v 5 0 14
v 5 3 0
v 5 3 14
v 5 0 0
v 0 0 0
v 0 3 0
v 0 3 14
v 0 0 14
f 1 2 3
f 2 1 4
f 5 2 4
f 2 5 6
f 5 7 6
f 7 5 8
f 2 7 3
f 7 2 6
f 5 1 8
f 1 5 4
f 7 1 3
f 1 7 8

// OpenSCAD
translate([2.5, 1.5, 1.0]) color([0.23049353673314077, 0.3658024748453319, 0.5965890354919068]) cube([5, 3, 2], center=true);
translate([2.5, 1.5, 3.0]) color([0.14329113966210216, 0.003232100641658797, 0.6590184917581017]) cube([5, 3, 2], center=true);
translate([2.5, 1.5, 5.0]) color([0.7321014772226084, 0.9009039411186286, 0.7479768172441763]) cube([5, 3, 2], center=true);
translate([2.5, 1.5, 7.0]) color([0.29326295382626455, 0.6894664766240866, 0.932788033819558]) cube([5, 3, 2], center=true);
translate([2.5, 1.5, 9.0]) color([0.23286310478430694, 0.14188743522012004, 0.4540480681686925]) cube([5, 3, 2], center=true);
translate([2.5, 1.5, 11.0]) color([0.4766939084563374, 0.7074804824528956, 0.2582188407343454]) cube([5, 3, 2], center=true);
translate([2.5, 1.5, 13.0]) color([0.027936242271358158, 0.20812012525081536, 0.33501316214628807]) cube([5, 3, 2], center=true);
